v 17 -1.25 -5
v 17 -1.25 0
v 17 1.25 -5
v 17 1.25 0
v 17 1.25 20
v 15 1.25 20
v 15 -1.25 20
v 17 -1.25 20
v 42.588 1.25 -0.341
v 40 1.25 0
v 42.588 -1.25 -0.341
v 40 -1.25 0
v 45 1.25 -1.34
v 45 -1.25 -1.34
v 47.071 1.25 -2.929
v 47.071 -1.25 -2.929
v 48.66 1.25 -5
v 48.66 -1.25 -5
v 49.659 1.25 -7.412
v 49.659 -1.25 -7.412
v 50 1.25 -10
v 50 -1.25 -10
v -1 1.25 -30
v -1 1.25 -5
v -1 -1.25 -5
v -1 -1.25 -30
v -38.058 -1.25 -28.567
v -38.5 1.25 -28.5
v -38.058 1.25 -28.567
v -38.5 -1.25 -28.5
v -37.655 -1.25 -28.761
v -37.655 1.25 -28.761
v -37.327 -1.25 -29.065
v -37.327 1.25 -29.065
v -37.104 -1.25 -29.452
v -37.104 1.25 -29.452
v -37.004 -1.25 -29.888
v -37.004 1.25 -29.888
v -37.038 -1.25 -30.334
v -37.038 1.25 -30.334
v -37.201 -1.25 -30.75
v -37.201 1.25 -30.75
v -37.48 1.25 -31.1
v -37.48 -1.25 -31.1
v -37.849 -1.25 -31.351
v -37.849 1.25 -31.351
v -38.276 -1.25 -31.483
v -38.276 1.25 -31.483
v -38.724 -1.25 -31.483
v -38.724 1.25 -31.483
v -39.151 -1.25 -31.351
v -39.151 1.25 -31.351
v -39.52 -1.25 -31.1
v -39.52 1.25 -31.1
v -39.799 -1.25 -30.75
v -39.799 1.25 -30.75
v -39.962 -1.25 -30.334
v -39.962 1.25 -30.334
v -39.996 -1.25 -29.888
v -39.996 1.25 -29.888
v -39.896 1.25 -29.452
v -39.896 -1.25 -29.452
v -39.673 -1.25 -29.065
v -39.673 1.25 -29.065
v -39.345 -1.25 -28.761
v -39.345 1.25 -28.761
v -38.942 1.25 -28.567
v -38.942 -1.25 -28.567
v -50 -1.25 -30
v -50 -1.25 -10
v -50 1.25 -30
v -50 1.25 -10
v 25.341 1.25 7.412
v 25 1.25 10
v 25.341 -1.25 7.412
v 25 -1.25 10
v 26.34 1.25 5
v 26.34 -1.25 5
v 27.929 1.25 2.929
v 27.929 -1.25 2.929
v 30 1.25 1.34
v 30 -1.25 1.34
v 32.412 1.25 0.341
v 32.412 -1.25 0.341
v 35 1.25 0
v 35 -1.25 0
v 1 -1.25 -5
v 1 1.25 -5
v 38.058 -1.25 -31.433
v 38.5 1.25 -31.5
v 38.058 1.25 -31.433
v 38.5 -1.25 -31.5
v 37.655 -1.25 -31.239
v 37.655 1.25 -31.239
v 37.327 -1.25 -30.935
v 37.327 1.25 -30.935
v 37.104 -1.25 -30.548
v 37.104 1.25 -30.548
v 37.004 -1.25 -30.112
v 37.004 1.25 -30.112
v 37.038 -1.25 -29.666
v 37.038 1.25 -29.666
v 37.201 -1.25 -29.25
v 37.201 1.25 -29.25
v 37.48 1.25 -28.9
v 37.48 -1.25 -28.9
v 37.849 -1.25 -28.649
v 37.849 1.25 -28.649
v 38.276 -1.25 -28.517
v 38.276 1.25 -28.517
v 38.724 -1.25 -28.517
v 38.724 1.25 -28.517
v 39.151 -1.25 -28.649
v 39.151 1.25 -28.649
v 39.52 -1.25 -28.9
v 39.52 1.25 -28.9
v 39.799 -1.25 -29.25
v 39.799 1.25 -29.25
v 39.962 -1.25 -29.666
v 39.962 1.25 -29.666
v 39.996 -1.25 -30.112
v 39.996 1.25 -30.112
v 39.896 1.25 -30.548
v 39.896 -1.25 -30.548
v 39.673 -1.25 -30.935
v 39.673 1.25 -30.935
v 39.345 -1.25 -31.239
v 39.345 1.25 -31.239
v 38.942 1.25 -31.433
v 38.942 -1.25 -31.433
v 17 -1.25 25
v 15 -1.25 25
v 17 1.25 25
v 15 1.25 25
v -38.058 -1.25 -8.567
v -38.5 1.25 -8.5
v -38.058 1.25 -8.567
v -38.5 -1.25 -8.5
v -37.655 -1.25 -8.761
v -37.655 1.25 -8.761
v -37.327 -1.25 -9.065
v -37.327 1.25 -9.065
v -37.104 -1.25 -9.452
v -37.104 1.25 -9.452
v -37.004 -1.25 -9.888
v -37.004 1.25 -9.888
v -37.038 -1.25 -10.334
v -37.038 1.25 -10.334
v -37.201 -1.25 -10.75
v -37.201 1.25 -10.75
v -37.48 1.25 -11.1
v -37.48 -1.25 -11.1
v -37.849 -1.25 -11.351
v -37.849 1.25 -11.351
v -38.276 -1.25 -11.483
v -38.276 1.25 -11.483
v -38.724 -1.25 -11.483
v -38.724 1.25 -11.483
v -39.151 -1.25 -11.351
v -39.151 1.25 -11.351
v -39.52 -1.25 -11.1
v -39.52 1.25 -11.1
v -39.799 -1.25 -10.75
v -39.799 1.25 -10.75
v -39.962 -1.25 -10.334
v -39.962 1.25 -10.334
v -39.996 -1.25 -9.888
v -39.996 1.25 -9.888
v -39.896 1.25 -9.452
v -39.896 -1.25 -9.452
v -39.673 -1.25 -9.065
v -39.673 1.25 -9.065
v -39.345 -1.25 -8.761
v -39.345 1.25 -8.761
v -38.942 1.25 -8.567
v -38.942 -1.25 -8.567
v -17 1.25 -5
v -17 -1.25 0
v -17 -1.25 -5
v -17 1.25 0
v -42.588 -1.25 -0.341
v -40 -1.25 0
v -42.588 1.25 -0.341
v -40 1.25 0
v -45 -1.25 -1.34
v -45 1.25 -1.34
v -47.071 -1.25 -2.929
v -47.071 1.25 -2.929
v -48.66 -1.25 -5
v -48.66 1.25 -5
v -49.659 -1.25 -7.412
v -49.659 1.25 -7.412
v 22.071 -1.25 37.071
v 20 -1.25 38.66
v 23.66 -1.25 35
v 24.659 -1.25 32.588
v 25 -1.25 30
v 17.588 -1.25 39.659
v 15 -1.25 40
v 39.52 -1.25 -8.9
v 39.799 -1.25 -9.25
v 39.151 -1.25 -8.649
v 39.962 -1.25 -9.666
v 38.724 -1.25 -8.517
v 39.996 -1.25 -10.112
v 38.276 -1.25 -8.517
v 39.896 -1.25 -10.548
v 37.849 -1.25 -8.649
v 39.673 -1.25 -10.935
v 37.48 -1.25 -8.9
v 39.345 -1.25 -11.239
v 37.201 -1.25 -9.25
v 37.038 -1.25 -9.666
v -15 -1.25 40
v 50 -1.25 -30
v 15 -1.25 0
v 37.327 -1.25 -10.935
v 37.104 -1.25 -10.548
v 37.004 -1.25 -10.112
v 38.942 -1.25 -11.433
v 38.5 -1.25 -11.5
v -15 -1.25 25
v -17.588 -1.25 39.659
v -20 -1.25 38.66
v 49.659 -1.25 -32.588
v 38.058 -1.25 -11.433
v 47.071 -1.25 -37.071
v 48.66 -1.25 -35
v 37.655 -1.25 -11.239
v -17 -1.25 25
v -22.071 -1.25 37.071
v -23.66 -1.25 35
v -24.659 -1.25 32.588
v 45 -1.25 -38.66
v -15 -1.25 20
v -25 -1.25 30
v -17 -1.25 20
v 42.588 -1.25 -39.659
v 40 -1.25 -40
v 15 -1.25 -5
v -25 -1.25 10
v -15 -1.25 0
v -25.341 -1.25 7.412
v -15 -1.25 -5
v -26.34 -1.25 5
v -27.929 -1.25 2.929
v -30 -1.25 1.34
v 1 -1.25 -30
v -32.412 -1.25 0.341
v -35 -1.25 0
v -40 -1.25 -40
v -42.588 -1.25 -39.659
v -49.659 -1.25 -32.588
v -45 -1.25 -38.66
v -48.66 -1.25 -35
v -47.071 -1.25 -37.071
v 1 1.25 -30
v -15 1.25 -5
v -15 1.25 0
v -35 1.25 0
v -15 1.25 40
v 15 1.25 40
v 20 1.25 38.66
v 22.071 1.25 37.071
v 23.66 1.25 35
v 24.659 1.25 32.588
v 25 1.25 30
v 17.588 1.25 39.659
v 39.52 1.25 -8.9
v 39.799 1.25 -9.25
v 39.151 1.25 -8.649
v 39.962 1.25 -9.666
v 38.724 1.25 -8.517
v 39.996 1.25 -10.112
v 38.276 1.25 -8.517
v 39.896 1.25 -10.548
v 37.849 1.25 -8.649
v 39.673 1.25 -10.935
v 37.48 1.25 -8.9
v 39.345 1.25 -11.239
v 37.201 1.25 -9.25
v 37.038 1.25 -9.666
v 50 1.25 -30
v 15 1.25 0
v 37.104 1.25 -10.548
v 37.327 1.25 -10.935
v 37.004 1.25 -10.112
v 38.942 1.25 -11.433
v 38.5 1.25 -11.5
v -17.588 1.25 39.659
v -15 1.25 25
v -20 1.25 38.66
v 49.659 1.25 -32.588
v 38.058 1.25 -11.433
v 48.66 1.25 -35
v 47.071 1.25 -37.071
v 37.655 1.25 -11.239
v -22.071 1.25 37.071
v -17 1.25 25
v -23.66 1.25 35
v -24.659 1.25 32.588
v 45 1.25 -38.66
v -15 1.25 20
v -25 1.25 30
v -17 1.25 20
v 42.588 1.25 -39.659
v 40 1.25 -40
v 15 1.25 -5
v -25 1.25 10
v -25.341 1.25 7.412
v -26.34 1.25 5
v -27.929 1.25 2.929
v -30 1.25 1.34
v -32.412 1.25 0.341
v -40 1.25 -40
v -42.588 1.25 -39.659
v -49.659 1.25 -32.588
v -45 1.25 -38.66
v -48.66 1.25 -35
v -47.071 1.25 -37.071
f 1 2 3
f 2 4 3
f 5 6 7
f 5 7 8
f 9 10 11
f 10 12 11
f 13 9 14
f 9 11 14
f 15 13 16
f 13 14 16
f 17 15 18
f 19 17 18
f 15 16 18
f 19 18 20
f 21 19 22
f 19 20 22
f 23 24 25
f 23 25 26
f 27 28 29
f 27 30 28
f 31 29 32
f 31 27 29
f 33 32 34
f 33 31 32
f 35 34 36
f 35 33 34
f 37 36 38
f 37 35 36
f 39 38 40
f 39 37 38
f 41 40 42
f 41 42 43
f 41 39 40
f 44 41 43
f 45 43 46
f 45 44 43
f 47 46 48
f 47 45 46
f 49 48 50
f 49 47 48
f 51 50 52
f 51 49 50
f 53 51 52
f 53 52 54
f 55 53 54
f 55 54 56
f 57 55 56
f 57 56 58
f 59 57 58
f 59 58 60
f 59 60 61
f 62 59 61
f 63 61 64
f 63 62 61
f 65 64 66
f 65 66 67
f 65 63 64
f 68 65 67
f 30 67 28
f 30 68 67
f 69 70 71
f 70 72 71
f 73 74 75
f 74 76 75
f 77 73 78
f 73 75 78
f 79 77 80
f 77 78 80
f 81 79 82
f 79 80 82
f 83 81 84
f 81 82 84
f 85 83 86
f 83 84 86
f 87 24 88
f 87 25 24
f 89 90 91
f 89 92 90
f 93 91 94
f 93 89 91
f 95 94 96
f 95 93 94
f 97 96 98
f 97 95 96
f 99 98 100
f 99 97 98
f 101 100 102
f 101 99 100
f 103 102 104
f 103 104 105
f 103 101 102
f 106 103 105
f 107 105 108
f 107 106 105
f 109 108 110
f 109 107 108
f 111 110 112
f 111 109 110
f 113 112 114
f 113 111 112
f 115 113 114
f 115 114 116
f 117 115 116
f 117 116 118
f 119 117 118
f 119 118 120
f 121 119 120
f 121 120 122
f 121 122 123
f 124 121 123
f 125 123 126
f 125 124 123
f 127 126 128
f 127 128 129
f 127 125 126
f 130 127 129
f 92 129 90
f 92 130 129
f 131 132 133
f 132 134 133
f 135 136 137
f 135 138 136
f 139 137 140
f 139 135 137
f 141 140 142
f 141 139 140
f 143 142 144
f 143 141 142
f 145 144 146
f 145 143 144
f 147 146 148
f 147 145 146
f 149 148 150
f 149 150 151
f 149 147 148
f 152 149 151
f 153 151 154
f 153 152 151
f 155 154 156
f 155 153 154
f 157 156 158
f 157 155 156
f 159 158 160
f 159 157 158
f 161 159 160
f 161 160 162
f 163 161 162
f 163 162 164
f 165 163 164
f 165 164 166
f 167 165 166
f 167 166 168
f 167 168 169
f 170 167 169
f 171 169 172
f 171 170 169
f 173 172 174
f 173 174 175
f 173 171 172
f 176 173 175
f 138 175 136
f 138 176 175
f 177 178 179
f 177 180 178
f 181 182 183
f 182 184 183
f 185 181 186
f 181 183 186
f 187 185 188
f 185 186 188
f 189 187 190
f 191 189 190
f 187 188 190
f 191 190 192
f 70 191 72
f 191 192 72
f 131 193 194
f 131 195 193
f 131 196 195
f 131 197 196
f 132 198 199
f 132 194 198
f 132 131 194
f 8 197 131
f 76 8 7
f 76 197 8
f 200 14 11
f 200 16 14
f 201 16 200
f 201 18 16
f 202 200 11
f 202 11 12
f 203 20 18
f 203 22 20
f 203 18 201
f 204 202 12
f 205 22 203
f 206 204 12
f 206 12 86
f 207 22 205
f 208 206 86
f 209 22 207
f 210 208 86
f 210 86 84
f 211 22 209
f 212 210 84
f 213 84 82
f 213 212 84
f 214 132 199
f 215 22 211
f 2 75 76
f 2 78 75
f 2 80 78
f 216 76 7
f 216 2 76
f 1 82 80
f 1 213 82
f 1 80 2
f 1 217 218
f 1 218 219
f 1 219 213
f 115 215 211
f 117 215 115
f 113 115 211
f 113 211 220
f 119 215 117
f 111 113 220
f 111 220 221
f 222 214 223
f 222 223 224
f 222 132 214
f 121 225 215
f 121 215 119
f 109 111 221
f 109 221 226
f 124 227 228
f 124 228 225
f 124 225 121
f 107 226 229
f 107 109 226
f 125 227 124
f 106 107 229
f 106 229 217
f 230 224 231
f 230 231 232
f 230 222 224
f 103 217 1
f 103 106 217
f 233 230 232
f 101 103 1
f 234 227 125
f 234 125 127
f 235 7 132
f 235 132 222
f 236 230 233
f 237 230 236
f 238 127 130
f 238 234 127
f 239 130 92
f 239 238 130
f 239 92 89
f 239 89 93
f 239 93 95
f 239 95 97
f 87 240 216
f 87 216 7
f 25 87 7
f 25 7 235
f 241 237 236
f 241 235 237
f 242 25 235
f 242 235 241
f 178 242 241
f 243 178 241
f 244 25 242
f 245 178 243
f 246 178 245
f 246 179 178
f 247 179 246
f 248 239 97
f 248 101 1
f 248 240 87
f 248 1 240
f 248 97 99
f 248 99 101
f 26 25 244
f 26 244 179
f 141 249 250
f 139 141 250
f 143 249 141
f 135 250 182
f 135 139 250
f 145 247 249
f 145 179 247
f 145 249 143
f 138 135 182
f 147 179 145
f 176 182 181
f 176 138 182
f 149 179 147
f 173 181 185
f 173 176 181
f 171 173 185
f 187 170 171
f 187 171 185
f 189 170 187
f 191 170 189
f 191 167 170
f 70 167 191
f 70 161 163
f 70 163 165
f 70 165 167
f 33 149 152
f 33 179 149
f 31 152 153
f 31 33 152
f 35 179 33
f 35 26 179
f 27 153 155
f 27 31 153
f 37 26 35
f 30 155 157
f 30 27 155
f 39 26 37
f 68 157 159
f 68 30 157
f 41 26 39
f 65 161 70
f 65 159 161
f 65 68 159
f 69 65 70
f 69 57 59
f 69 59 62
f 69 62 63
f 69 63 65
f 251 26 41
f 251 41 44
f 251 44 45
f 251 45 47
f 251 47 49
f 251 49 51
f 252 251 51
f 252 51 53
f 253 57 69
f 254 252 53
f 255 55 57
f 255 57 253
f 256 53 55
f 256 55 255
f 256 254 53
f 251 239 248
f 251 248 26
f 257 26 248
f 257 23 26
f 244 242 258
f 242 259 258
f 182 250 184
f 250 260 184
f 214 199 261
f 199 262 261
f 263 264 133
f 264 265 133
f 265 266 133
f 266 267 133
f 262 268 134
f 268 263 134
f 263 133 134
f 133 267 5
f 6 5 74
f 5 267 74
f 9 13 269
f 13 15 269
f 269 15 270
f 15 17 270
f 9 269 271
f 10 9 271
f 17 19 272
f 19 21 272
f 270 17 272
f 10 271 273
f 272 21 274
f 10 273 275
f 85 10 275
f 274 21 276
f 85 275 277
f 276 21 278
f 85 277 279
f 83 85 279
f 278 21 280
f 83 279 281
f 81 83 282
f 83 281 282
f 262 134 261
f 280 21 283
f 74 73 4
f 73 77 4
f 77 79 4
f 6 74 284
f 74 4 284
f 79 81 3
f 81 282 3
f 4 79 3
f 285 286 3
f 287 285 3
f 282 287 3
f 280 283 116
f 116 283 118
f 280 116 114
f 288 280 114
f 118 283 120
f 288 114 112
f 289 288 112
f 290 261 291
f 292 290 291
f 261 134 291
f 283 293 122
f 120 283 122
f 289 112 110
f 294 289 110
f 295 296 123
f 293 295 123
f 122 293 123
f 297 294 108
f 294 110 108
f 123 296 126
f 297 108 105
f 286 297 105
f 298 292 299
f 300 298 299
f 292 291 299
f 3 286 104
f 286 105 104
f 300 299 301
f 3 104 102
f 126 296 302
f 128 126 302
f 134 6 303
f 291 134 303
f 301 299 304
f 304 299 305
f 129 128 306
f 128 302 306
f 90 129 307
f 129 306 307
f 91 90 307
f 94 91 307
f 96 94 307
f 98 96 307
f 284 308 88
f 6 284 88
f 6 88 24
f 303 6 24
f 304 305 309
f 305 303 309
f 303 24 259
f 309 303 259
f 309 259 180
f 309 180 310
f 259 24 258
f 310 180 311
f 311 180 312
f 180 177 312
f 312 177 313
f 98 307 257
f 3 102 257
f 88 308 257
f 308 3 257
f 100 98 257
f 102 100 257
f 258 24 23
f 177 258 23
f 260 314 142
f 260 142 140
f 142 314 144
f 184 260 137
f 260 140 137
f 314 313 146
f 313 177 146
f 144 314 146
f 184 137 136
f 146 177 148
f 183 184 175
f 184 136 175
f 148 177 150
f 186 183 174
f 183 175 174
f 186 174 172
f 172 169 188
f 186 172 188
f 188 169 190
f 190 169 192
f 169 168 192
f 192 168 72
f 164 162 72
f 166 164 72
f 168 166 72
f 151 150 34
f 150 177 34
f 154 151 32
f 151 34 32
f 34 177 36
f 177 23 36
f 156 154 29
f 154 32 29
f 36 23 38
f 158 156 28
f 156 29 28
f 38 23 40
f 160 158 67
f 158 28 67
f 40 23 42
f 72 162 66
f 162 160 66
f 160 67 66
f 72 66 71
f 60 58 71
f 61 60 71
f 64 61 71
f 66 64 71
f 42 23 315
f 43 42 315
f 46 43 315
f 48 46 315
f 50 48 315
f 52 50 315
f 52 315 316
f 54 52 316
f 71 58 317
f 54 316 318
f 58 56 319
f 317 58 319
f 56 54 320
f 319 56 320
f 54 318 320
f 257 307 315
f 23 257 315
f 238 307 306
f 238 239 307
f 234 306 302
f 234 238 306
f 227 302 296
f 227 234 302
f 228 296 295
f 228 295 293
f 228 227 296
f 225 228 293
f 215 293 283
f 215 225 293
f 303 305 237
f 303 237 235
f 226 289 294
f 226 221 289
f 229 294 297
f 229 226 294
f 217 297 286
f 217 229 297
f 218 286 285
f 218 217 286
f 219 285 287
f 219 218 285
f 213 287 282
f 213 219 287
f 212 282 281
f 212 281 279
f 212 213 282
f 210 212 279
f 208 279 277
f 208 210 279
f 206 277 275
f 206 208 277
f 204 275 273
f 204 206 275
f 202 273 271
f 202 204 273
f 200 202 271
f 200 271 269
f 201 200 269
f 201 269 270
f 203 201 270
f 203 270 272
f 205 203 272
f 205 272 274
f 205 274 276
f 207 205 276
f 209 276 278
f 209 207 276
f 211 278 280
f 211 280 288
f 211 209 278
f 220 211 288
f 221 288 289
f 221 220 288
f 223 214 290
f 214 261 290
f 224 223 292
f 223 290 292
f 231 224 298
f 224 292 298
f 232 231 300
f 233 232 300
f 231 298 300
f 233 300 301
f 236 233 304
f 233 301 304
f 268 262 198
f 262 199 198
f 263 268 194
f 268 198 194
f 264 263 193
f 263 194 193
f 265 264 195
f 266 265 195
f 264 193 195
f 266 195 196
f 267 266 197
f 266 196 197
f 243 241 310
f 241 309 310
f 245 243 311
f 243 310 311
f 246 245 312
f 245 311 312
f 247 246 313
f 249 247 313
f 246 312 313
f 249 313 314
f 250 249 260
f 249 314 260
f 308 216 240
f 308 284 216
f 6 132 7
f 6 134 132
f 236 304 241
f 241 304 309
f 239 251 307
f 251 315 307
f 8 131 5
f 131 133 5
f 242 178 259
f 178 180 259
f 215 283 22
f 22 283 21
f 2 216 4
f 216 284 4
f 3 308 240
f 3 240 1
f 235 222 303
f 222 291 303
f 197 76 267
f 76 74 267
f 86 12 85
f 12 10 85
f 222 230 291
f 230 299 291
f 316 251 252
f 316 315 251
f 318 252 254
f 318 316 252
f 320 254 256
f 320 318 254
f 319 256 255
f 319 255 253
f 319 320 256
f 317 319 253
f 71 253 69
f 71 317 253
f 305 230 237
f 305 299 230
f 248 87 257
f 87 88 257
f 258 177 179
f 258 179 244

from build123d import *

# Parameters (mm, degrees)
SKETCH1_R           = 1.5
SKETCH1_W           = 2
SKETCH1_H           = 5
SKETCH1_H_2         = 25
BOSS_EXTRUDE1_DEPTH = 1.25
FILLET1_R           = 10


with BuildPart() as part:
    # Sketch1 → Boss-Extrude1 (new, symmetric)
    with BuildSketch(Plane(origin=(0, 0, 0), x_dir=(1, 0, 0), z_dir=(0, 1, 0))):
        Polygon((-50, 40), (50, 40), (50, 0), (25, 0), (25, -40), (-25, -40), (-25, 0), (-50, 0), align=None)
        with Locations(Location((-38.5, 30, 0), (0, 0, 270))):
            Circle(SKETCH1_R, mode=Mode.SUBTRACT)
        with Locations(Location((38.5, 30, 0), (0, 0, 90))):
            Circle(SKETCH1_R, mode=Mode.SUBTRACT)
        with Locations(Location((-38.5, 10, 0), (0, 0, 270))):
            Circle(SKETCH1_R, mode=Mode.SUBTRACT)
        with Locations(Location((38.5, 10, 0), (0, 0, 90))):
            Circle(SKETCH1_R, mode=Mode.SUBTRACT)
        with Locations((16, -22.5)):
            Rectangle(SKETCH1_W, SKETCH1_H, mode=Mode.SUBTRACT)
        with Locations((-16, -22.5)):
            Rectangle(SKETCH1_W, SKETCH1_H, mode=Mode.SUBTRACT)
        with Locations((-16, 2.5)):
            Rectangle(SKETCH1_W, SKETCH1_H, mode=Mode.SUBTRACT)
        with Locations((16, 2.5)):
            Rectangle(SKETCH1_W, SKETCH1_H, mode=Mode.SUBTRACT)
        with Locations((0, 17.5)):
            Rectangle(SKETCH1_W, SKETCH1_H_2, mode=Mode.SUBTRACT)
    extrude(amount=BOSS_EXTRUDE1_DEPTH, both=True)

    # Fillet1
    fillet1_edges = [part.edges().sort_by_distance(p)[0] for p in [
        (50, 0, 0),
        (25, 0, 0),
        (25, 0, 40),
        (-25, 0, 40),
        (-25, 0, 0),
        (-50, 0, 0),
        (-50, 0, -40),
        (50, 0, -40),
    ]]
    fillet(fillet1_edges, radius=FILLET1_R)


solid = part.part
